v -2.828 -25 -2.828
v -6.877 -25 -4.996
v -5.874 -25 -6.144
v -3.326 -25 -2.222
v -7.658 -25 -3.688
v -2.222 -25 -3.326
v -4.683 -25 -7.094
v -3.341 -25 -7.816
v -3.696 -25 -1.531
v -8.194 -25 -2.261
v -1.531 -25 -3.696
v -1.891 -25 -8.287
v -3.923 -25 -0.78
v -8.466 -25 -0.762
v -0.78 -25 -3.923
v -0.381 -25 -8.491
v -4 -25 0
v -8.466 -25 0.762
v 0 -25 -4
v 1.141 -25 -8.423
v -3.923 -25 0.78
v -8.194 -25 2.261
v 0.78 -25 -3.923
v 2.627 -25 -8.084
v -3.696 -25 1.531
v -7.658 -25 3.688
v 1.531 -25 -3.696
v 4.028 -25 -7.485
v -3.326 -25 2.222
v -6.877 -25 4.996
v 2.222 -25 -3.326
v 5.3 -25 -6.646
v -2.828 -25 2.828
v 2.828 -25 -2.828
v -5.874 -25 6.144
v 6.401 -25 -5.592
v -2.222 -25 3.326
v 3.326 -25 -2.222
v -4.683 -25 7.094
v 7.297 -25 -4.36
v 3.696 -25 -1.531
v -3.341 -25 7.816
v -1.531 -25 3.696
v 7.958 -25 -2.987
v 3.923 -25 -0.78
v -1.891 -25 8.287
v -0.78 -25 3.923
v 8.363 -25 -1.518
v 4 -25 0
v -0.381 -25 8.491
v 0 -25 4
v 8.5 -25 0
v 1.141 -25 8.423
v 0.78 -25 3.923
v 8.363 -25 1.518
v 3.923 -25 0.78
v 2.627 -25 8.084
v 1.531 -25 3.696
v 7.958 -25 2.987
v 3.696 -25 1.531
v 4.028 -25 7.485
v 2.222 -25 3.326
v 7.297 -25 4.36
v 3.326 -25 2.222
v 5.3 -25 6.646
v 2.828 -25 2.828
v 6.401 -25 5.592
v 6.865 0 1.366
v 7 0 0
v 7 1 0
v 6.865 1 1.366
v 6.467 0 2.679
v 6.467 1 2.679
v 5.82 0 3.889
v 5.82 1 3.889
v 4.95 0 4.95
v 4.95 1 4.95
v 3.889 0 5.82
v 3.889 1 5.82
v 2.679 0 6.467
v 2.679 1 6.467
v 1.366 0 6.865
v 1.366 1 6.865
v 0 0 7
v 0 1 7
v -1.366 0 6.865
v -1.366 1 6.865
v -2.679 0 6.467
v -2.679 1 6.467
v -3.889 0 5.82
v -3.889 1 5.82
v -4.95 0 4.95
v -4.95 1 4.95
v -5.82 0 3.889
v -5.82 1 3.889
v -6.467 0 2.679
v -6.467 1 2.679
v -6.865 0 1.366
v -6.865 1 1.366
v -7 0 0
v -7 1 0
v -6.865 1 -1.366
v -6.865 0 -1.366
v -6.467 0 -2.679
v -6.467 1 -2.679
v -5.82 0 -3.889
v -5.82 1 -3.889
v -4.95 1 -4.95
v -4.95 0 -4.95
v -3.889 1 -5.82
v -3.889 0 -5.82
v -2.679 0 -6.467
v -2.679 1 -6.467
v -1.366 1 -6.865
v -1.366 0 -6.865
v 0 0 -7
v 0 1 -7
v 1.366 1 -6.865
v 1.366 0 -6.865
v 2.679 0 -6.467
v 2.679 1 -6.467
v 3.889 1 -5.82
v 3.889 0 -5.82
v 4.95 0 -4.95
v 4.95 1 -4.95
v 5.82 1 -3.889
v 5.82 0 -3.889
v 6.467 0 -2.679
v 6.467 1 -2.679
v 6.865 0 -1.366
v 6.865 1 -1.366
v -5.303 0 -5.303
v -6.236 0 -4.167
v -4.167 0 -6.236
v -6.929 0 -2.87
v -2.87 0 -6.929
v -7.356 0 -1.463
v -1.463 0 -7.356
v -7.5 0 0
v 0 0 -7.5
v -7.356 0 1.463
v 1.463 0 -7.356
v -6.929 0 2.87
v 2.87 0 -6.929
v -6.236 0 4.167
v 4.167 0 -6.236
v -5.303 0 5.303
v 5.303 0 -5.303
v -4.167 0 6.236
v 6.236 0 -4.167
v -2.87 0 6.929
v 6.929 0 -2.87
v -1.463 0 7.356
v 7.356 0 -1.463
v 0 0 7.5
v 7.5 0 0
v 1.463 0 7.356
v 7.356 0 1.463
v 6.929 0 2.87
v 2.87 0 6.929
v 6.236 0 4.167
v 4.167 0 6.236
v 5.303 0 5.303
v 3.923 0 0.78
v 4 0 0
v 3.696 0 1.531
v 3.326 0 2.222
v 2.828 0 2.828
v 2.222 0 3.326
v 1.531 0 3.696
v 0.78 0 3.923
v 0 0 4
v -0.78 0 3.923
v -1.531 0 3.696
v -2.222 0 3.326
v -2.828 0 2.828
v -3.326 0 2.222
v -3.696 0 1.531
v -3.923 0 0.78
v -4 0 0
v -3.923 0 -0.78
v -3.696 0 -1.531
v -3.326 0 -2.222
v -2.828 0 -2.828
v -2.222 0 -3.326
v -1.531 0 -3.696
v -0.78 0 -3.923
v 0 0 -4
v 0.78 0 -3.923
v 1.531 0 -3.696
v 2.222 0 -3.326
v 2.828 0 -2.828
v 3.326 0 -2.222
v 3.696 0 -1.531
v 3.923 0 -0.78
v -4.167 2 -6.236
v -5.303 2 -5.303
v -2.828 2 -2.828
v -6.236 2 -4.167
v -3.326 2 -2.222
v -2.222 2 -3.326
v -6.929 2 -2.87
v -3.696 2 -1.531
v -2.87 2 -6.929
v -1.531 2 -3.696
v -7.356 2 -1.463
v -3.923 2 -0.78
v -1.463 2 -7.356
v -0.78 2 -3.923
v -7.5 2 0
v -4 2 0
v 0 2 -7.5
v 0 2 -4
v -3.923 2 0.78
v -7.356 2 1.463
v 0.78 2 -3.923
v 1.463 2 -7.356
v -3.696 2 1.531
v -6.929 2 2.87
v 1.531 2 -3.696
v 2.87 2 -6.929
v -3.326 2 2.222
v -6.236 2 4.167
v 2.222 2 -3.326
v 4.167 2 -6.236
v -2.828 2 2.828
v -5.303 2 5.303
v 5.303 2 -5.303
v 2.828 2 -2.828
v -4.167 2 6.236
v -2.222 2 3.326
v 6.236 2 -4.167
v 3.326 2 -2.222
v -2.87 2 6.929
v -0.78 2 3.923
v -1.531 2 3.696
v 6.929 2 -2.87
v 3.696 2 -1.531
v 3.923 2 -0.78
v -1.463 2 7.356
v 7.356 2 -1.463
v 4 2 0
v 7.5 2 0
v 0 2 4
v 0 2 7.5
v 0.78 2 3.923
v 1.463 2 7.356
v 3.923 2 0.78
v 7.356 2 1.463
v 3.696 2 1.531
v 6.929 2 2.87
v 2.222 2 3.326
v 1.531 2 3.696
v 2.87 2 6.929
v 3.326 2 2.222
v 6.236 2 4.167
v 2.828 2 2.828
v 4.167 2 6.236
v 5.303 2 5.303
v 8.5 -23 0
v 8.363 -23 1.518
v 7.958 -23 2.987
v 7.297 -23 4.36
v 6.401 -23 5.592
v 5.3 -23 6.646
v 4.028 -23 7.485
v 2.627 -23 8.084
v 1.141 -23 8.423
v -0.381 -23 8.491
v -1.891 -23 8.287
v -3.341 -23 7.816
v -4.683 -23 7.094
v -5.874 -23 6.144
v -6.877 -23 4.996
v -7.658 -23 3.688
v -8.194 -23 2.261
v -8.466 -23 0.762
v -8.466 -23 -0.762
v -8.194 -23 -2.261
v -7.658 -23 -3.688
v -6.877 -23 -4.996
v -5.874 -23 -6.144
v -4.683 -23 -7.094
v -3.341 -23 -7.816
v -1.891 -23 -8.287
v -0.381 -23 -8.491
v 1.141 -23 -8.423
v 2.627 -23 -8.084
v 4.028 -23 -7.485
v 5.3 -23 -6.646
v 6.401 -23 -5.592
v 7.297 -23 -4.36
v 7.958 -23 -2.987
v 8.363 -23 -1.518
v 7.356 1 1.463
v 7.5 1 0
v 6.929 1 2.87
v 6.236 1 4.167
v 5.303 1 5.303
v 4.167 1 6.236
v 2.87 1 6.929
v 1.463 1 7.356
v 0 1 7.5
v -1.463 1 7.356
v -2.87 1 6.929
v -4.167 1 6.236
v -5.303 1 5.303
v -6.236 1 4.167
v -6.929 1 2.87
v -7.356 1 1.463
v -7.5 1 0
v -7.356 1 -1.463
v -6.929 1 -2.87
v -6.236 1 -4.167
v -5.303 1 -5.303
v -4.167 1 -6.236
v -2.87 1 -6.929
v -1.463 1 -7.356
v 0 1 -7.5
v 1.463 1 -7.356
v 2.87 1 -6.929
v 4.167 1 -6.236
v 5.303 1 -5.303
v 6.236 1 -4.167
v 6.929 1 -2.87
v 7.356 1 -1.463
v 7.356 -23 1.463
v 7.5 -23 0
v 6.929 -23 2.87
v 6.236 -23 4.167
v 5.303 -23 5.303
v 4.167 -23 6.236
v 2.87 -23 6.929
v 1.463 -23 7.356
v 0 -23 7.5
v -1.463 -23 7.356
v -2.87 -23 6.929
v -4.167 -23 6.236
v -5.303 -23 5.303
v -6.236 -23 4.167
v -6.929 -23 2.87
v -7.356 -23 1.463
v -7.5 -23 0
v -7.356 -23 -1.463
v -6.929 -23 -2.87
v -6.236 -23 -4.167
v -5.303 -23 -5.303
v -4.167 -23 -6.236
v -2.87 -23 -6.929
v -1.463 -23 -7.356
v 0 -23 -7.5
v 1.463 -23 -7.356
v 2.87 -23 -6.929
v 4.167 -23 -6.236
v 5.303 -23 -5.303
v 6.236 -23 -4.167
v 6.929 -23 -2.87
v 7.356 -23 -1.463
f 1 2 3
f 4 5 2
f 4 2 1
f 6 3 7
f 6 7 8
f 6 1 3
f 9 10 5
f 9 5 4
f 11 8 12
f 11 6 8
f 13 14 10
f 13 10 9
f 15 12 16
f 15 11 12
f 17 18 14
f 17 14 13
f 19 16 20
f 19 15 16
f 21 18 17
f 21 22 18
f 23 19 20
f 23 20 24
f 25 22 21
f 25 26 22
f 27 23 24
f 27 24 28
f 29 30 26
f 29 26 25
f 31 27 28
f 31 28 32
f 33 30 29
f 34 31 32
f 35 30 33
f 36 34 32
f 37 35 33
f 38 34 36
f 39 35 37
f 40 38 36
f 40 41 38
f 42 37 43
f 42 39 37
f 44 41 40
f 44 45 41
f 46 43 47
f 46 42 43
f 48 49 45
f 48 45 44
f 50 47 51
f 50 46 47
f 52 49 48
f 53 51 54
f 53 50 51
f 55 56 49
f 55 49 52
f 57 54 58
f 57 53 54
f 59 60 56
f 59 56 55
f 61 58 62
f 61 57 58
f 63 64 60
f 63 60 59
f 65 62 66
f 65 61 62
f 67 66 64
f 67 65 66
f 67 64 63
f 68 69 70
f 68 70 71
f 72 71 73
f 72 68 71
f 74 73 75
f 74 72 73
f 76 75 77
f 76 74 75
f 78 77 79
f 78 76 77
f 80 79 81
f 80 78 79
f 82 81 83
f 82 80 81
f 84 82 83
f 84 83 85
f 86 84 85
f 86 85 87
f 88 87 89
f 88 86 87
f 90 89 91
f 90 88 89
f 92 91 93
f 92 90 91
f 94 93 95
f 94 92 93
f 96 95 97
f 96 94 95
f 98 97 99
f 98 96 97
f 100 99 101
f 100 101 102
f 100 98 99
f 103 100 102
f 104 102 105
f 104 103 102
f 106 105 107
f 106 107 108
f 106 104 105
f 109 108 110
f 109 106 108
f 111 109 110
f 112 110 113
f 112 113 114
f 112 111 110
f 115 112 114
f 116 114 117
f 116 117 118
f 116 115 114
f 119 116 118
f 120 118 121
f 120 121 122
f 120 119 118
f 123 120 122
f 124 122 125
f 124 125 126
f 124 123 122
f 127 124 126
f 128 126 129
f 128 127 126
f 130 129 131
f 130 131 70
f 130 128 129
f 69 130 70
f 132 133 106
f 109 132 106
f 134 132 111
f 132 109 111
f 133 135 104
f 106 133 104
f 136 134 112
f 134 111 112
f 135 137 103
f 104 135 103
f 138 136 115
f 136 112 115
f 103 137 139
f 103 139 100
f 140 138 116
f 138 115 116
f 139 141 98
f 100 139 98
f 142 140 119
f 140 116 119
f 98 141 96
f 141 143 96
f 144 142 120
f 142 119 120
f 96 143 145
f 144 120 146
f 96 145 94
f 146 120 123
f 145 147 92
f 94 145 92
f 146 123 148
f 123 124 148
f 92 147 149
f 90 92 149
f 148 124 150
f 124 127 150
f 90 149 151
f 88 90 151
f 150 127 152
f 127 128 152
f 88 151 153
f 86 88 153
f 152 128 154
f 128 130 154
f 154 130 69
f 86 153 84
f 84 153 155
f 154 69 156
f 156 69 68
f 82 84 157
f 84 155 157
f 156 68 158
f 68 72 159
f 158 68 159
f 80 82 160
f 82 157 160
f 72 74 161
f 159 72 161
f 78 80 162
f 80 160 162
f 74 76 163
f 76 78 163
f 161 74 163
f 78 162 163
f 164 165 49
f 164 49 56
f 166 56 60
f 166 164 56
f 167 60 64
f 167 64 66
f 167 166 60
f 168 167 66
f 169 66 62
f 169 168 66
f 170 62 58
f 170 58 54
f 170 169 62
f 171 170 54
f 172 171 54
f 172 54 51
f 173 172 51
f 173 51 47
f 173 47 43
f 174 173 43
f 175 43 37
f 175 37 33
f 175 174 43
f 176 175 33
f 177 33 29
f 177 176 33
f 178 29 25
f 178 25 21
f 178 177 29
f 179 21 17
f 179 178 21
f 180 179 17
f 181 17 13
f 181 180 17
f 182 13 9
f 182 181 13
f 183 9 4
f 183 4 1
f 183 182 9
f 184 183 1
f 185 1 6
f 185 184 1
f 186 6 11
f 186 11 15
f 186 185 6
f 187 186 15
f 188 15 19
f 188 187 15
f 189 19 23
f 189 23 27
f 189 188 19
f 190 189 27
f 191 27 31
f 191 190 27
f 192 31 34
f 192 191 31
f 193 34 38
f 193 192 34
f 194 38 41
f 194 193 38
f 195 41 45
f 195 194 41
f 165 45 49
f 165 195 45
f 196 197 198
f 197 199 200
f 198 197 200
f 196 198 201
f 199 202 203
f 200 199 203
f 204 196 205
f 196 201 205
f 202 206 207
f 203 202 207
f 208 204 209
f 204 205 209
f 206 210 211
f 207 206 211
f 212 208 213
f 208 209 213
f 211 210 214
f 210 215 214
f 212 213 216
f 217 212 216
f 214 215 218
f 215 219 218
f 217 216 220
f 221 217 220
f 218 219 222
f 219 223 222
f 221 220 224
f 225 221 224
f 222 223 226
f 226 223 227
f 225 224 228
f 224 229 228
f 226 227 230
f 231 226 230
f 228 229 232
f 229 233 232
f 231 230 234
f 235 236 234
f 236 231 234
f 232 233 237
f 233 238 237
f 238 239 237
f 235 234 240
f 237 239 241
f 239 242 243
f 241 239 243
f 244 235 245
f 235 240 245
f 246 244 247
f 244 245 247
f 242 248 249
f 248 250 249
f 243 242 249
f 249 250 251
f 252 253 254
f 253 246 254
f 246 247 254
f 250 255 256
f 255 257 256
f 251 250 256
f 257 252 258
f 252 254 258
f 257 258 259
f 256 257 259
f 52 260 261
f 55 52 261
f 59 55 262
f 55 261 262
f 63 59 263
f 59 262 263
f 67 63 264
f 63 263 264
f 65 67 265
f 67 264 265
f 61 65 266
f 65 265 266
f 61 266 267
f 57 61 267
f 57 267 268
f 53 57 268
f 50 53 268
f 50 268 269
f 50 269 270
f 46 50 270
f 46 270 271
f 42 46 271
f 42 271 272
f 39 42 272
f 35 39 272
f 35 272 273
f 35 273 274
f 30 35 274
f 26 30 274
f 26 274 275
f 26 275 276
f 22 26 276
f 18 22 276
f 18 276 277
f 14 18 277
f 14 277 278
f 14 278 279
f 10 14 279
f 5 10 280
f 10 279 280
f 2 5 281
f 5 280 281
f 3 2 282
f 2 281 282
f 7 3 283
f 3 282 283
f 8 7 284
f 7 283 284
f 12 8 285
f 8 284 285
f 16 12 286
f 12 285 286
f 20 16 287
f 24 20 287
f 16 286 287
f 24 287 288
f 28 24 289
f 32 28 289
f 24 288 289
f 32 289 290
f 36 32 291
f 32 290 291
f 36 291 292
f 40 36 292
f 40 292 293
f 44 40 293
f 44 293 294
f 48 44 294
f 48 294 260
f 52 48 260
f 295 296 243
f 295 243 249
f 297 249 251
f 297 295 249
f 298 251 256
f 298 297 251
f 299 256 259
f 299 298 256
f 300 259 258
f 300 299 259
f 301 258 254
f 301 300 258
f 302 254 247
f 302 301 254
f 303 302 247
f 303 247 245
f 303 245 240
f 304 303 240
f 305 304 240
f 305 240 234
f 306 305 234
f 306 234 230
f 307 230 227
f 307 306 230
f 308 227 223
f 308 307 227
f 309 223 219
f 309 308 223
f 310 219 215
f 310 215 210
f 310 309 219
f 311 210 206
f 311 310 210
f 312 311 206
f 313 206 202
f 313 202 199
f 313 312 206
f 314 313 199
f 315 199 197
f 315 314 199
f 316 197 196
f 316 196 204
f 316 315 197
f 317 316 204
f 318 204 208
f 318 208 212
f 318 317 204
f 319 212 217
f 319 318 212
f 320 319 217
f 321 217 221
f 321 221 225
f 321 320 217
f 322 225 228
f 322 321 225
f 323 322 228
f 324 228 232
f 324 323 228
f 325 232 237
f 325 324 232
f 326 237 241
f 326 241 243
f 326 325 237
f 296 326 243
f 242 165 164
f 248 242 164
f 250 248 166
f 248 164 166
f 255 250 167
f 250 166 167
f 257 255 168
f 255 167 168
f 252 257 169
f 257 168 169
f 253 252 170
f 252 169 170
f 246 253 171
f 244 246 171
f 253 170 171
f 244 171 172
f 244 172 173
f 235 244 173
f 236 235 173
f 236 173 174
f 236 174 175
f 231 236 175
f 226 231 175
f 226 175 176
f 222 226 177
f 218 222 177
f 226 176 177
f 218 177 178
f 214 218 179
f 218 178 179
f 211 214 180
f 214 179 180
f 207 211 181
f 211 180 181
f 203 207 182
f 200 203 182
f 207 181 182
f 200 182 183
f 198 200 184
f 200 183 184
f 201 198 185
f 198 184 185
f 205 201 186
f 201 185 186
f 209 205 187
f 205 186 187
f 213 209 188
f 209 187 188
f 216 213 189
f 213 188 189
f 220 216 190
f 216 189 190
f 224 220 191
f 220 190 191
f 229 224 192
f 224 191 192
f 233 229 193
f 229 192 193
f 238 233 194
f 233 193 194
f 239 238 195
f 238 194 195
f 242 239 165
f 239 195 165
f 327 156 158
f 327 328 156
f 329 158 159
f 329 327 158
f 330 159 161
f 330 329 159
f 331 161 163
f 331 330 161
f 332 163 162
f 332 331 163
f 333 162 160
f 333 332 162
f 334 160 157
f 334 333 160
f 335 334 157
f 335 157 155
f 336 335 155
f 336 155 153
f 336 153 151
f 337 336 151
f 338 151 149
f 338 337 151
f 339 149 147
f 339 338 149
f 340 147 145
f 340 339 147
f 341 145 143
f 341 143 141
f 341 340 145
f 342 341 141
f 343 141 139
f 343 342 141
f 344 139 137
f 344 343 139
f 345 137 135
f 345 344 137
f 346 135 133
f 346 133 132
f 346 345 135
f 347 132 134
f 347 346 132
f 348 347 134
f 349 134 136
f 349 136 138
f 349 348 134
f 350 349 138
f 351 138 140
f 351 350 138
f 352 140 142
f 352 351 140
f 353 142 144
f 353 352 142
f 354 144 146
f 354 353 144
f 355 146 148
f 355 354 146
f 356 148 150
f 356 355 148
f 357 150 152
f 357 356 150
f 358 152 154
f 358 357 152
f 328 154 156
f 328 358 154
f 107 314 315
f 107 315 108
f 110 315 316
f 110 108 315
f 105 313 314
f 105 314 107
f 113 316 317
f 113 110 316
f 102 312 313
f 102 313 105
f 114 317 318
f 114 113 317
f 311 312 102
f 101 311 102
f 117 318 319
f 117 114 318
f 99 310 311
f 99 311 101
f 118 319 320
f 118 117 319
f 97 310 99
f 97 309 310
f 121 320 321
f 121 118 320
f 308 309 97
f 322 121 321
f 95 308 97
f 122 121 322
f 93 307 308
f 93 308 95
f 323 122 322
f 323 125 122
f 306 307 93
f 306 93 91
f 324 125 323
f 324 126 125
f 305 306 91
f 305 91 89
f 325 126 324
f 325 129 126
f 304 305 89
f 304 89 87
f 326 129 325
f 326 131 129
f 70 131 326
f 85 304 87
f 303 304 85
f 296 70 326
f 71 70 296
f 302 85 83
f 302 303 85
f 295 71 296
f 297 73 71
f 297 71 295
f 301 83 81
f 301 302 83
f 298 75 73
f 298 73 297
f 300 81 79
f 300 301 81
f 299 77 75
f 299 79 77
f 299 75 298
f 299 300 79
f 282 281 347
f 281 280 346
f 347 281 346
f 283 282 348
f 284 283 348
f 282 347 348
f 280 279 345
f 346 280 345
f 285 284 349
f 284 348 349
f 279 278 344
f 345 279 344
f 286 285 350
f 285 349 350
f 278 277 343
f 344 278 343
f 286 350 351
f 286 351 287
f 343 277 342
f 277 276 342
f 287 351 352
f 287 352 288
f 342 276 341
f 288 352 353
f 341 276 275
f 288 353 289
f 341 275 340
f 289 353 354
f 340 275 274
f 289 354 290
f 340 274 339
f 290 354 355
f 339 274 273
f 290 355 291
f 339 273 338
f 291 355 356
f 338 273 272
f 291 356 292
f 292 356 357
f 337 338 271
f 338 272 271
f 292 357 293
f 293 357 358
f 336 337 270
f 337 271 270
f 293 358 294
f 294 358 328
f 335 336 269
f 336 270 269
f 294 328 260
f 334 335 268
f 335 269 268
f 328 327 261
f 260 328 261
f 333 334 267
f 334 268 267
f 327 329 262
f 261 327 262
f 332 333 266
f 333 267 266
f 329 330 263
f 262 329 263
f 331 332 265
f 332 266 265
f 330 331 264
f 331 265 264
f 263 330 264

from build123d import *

# Parameters (mm, degrees)
F0_R     = 8.5
F0_R_2   = 7.5
F0_R_3   = 7
F0_R_4   = 4
F1_DEPTH = 25
F2_DEPTH = 23
F3_DEPTH = 2
F4_DEPTH = 1


with BuildPart() as f1:
    # F0 (on Front) → F1 (new body)
    with BuildSketch(Plane.XZ):
        Circle(F0_R)
        Circle(F0_R_2, mode=Mode.SUBTRACT)
        Circle(F0_R_2)
        Circle(F0_R_3, mode=Mode.SUBTRACT)
        Circle(F0_R_3)
        Circle(F0_R_4, mode=Mode.SUBTRACT)
    extrude(amount=F1_DEPTH)

    # F0 (on Front) → F2 (cut)
    with BuildSketch(Plane.XZ):
        Circle(F0_R)
        Circle(F0_R_2, mode=Mode.SUBTRACT)
    extrude(amount=F2_DEPTH, mode=Mode.SUBTRACT)

    # F0 (on Front) → F3 (join)
    with BuildSketch(Plane.XZ):
        Circle(F0_R_2)
        Circle(F0_R_3, mode=Mode.SUBTRACT)
        Circle(F0_R_3)
        Circle(F0_R_4, mode=Mode.SUBTRACT)
    extrude(amount=-F3_DEPTH)

    # F0 (on Front) → F4 (cut)
    with BuildSketch(Plane.XZ):
        Circle(F0_R_2)
        Circle(F0_R_3, mode=Mode.SUBTRACT)
    extrude(amount=-F4_DEPTH, mode=Mode.SUBTRACT)


solid = f1.part
